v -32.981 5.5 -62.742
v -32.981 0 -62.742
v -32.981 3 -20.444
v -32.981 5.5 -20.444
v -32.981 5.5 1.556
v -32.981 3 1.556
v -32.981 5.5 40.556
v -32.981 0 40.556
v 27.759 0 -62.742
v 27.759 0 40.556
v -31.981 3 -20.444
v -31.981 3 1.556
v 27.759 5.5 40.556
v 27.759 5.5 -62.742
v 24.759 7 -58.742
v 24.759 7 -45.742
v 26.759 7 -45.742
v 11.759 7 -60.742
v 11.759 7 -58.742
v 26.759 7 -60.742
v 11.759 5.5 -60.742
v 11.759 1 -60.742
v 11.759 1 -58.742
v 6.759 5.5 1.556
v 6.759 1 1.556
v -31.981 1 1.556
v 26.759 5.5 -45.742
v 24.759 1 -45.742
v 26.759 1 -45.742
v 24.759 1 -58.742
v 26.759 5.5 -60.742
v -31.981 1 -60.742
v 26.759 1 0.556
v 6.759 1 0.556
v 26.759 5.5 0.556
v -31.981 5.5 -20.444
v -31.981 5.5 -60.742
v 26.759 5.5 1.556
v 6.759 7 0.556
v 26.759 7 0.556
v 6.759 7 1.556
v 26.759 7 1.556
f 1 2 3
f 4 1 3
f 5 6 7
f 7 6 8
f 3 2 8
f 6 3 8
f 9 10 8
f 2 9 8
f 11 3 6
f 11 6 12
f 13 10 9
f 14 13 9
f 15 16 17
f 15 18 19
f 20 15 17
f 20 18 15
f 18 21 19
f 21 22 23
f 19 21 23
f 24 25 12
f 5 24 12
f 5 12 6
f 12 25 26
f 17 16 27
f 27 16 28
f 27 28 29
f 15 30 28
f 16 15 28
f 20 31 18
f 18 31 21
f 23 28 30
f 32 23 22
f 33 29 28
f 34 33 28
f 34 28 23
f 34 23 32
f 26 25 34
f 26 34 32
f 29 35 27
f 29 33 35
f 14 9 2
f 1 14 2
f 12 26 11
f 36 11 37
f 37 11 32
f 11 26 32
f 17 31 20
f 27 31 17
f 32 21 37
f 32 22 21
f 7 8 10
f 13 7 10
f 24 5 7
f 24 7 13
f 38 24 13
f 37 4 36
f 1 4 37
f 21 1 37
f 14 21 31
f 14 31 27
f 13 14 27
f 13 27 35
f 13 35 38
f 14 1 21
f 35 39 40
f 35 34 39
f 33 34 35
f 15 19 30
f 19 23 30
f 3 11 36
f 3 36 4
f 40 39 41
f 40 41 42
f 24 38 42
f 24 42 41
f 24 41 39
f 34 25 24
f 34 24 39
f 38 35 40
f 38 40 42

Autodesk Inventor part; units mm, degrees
ref_plane "YZ Plane" through (0, 0, 0) normal (1, 0, 0) x (0, 1, 0)
ref_plane "XZ Plane" through (0, 0, 0) normal (0, 1, 0) x (-1, 0, 0)
ref_plane "XY Plane" through (0, 0, 0) normal (0, 0, 1) x (1, 0, 0)
sketch "Sketch1" plane through (0, 0, 0) normal (0, 1, 0) x (-1, 0, 0)
  line L0 (32.9806, 40.5565) -> (-27.7594, 40.5565)
  line L1 (-27.7594, 40.5565) -> (-27.7594, -62.7415)
  line L2 (-27.7594, -62.7415) -> (32.9806, -62.7415)
  line L3 (32.9806, -62.7415) -> (32.9806, 40.5565)
  point P0 (0, 0)
  dimension "d0" = 60.74
  dimension "d1" = 103.298
extrude "Extrusion1" add sketch "Sketch1" along normal blind 1
sketch "Sketch2" plane through (0, 1, 0) normal (0, 1, 0) x (1, 0, 0)
  line L0 (-32.9806, 62.7415) -> (-32.9806, -40.5565) projected
  line L1 (27.7594, -40.5565) -> (27.7594, 62.7415) projected
  line L2 (-32.9806, -40.5565) -> (27.7594, -40.5565)
  line L3 (27.7594, -40.5565) -> (27.7594, -1.5565)
  line L4 (27.7594, -1.5565) -> (-32.9806, -1.5565)
  line L5 (-32.9806, -1.5565) -> (-32.9806, -40.5565)
  point P0 (0, 0)
  point P1 (-32.9806, -1.5565)
  dimension "d4" = 39
extrude "Extrusion2" add sketch "Sketch2" along normal blind 4.5
sketch "Sketch3" plane through (0, 1, 0) normal (0, 1, 0) x (1, 0, 0)
  line L0 (27.7594, -1.5565) -> (-32.9806, -1.5565) projected
  line L1 (27.7594, 62.7415) -> (-32.9806, 62.7415) projected
  line L2 (-32.9806, -1.5565) -> (-31.9806, -1.5565)
  line L3 (-31.9806, -1.5565) -> (-31.9806, 62.7415)
  line L4 (-31.9806, 62.7415) -> (-32.9806, 62.7415)
  line L5 (-32.9806, 62.7415) -> (-32.9806, -1.5565)
  line L6 (-31.9806, 62.7415) -> (27.7594, 62.7415)
  line L7 (27.7594, 62.7415) -> (27.7594, 60.7415)
  line L8 (27.7594, 60.7415) -> (-31.9806, 60.7415)
  line L9 (-31.9806, 60.7415) -> (-31.9806, 62.7415)
  line L10 (27.7594, -40.5565) -> (27.7594, 62.7415) projected
  line L11 (27.7594, -1.5565) -> (26.7594, -1.5565)
  line L12 (26.7594, -1.5565) -> (26.7594, 60.7415)
  line L13 (26.7594, 60.7415) -> (27.7594, 60.7415)
  line L14 (27.7594, 60.7415) -> (27.7594, -1.5565)
  line L15 (-32.9806, -1.5565) -> (-31.9806, -1.5565)
  line L16 (-31.9806, -1.5565) -> (-31.9806, 20.4435)
  line L17 (-31.9806, 20.4435) -> (-32.9806, 20.4435)
  line L18 (-32.9806, 20.4435) -> (-32.9806, -1.5565)
  point P0 (0, 0)
  point P1 (27.2594, -1.5565)
  point P2 (-31.9806, 60.7415)
  point P3 (-32.4806, -1.5565)
  point P4 (-32.4806, 20.4435)
  dimension "d7" = 1
  dimension "d8" = 2
  dimension "d9" = 1
  dimension "d10" = 0
  dimension "d13" = 22
extrude "Extrusion3" add sketch "Sketch3" along normal blind 4.5 contours L0 L12 L8 L10 | L8 L3 L1 L7 | L17 L5 L1 L3
sketch "Sketch4" plane through (0, 1, 0) normal (0, 1, 0) x (1, 0, 0)
  line L0 (-32.9806, 62.7415) -> (-32.9806, -40.5565) projected
  line L1 (-31.9806, 20.4435) -> (-32.9806, 20.4435)
  line L2 (-32.9806, 20.4435) -> (-32.9806, -2.617)
  line L3 (-32.9806, -2.617) -> (-31.9806, -2.617)
  line L4 (-31.9806, -2.617) -> (-31.9806, 20.4435)
  point P0 (0, 0)
extrude "Extrusion4" add sketch "Sketch4" along normal blind 2
sketch "Sketch5" plane through (0, 1, 0) normal (0, 1, 0) x (1, 0, 0)
  line L0 (26.7594, 60.7415) -> (26.7594, -1.5565) projected
  line L1 (26.7594, 60.7415) -> (11.7594, 60.7415)
  line L2 (11.7594, 60.7415) -> (11.7594, 58.7415)
  line L3 (11.7594, 58.7415) -> (26.7594, 58.7415)
  line L4 (26.7594, 58.7415) -> (26.7594, 60.7415)
  line L5 (26.7594, 60.7415) -> (24.7594, 60.7415)
  line L6 (24.7594, 60.7415) -> (24.7594, 45.7415)
  line L7 (24.7594, 45.7415) -> (26.7594, 45.7415)
  line L8 (26.7594, 45.7415) -> (26.7594, 60.7415)
  line L9 (26.7594, -1.5565) -> (6.7594, -1.5565)
  line L10 (6.7594, -1.5565) -> (6.7594, -0.5565)
  line L11 (6.7594, -0.5565) -> (26.7594, -0.5565)
  line L12 (26.7594, -0.5565) -> (26.7594, -1.5565)
  point P0 (0, 0)
  point P1 (26.7594, 59.7415)
  point P2 (11.7594, 59.7415)
  point P3 (25.7594, 45.7415)
  point P4 (25.7594, 60.7415)
  point P5 (26.7594, -1.0565)
  point P6 (6.7594, -1.0565)
  point P7 (24.7594, 58.7415)
  dimension "d16" = 2
  dimension "d17" = 15
  dimension "d18" = 2
  dimension "d19" = 15
  dimension "d20" = 1
  dimension "d21" = 20
extrude "Extrusion5" add sketch "Sketch5" along normal blind 6
properties part number "Lid bottom"
